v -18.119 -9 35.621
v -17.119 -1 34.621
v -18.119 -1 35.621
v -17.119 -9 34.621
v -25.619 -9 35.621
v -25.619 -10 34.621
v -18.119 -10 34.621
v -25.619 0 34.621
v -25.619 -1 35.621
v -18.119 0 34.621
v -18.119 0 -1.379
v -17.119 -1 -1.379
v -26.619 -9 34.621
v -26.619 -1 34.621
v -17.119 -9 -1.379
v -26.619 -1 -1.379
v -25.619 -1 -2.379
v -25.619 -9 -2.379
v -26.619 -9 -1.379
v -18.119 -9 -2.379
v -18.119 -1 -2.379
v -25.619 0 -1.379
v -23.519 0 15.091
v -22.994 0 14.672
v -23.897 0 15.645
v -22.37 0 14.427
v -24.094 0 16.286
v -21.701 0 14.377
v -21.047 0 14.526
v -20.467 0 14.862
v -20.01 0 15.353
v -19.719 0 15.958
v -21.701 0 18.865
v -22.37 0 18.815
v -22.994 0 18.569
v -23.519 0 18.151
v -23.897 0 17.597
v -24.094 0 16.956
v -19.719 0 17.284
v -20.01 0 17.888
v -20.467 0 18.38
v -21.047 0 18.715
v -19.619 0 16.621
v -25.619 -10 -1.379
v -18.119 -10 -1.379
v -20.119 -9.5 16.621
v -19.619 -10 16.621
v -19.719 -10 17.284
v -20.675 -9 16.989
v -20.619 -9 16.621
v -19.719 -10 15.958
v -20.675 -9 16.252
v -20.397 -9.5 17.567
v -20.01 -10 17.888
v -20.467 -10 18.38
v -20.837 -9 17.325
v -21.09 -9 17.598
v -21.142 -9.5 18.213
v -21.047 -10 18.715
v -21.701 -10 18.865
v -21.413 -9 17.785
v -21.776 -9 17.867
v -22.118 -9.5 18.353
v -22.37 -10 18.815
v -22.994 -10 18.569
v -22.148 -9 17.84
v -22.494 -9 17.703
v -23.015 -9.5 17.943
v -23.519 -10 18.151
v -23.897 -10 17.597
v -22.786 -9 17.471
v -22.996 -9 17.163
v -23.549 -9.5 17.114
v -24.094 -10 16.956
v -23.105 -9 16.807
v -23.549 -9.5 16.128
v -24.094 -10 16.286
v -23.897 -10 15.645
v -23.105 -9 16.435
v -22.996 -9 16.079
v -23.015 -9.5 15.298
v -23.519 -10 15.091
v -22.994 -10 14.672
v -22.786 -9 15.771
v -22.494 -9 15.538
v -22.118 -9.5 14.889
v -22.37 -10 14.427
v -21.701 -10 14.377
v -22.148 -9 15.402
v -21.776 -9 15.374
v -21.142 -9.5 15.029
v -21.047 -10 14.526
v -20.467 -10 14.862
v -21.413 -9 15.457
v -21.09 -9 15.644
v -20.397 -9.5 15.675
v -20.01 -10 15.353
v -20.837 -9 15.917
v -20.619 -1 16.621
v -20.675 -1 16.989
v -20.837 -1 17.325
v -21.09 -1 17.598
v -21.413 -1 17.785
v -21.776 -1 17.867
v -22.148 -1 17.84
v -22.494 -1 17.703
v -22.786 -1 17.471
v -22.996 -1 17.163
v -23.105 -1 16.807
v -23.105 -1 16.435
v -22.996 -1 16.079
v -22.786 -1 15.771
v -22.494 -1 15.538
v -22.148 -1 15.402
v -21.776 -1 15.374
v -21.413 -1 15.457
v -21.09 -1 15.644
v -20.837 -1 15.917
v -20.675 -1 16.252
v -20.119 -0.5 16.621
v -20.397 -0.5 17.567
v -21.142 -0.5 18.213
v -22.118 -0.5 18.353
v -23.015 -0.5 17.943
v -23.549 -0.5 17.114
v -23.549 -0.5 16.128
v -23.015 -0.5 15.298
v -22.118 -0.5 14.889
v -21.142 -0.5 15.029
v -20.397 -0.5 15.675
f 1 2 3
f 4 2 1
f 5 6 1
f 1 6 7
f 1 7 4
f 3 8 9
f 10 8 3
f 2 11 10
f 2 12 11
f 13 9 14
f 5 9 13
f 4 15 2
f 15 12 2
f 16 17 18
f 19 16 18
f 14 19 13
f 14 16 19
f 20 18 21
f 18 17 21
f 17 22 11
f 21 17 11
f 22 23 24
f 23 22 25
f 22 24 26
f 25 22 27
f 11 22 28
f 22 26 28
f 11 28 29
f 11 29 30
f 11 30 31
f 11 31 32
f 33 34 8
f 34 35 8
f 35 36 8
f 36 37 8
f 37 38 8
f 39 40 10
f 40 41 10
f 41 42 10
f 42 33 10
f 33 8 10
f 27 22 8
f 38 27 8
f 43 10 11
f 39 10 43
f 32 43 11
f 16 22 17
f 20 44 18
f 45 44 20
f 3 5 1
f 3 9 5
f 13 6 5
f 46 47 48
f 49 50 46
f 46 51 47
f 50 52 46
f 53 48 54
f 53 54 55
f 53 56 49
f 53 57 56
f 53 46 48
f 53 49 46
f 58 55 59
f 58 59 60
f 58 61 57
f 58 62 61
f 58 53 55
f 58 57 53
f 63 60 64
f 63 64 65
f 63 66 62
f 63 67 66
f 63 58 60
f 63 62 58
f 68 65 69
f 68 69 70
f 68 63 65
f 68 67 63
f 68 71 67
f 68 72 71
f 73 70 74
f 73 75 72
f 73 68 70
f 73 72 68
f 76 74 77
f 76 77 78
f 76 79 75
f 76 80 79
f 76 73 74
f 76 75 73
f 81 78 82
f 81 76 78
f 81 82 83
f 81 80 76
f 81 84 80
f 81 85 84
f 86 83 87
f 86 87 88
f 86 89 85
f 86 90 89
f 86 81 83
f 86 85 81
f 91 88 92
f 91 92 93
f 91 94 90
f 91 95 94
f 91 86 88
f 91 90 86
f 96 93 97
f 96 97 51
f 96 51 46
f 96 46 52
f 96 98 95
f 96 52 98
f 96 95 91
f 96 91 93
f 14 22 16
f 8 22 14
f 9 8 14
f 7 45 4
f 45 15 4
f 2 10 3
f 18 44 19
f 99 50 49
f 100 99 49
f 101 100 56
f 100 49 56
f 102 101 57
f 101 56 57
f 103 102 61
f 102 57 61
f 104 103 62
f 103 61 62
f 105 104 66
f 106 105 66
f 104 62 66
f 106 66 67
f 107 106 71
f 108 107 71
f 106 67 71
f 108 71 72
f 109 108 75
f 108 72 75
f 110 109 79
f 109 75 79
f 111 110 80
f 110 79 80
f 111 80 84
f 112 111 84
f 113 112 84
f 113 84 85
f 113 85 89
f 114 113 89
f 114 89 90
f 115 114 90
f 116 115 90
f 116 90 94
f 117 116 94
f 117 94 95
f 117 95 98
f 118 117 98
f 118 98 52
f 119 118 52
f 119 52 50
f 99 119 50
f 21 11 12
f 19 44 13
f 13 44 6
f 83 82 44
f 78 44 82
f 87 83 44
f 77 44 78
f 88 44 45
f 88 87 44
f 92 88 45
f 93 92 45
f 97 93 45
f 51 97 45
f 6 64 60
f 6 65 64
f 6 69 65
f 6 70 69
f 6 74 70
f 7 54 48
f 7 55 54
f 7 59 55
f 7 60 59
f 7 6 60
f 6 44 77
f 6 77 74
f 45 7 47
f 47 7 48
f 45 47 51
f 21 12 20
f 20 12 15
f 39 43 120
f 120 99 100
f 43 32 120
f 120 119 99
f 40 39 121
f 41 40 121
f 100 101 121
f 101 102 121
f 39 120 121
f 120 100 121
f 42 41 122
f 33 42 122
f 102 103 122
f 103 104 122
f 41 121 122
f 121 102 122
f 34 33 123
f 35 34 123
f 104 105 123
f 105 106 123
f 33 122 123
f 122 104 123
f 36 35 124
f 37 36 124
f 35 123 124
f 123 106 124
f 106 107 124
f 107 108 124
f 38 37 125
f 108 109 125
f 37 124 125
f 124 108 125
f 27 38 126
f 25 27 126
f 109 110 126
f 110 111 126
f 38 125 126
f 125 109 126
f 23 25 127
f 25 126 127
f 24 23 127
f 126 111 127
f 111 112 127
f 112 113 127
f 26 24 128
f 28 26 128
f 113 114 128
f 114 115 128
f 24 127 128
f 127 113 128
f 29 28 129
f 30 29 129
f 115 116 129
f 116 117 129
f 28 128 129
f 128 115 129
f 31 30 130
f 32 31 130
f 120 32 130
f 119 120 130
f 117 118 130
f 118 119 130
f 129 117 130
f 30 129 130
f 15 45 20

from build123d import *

# Parameters (mm, degrees)
F0_W     = 9.5
F0_H     = 38
F1_DEPTH = 10
F2_R     = 1.25
F3_DEPTH = 25
F4_SIZE  = 1


with BuildPart() as f1:
    # F0 (on Front) → F1 (new body)
    with BuildSketch(Plane.XZ):
        with Locations((-21.8694014475, 16.620930075)):
            Rectangle(F0_W, F0_H)
    extrude(amount=F1_DEPTH)

    # F2 (on face) → F3 (cut)
    with BuildSketch(Plane.XZ.offset(10)):
        with Locations((-21.8694014475, 16.620930075)):
            Circle(F2_R)
    extrude(amount=-F3_DEPTH, mode=Mode.SUBTRACT)

    # F4
    f4_edges = [f1.edges().sort_by_distance(p)[0] for p in [
        (-21.869401, -10, 35.62093),
        (-17.119401, -10, 16.62093),
        (-26.619401, -10, 16.62093),
        (-21.869401, -10, -2.37907),
        (-23.119401, -10, 16.62093),
        (-21.869401, 0, 35.62093),
        (-17.119401, 0, 16.62093),
        (-26.619401, 0, 16.62093),
        (-21.869401, 0, -2.37907),
        (-23.119401, 0, 16.62093),
        (-26.619401, -5, 35.62093),
        (-26.619401, -5, -2.37907),
        (-17.119401, -5, -2.37907),
        (-17.119401, -5, 35.62093),
    ]]
    chamfer(f4_edges, length=F4_SIZE)


solid = f1.part
